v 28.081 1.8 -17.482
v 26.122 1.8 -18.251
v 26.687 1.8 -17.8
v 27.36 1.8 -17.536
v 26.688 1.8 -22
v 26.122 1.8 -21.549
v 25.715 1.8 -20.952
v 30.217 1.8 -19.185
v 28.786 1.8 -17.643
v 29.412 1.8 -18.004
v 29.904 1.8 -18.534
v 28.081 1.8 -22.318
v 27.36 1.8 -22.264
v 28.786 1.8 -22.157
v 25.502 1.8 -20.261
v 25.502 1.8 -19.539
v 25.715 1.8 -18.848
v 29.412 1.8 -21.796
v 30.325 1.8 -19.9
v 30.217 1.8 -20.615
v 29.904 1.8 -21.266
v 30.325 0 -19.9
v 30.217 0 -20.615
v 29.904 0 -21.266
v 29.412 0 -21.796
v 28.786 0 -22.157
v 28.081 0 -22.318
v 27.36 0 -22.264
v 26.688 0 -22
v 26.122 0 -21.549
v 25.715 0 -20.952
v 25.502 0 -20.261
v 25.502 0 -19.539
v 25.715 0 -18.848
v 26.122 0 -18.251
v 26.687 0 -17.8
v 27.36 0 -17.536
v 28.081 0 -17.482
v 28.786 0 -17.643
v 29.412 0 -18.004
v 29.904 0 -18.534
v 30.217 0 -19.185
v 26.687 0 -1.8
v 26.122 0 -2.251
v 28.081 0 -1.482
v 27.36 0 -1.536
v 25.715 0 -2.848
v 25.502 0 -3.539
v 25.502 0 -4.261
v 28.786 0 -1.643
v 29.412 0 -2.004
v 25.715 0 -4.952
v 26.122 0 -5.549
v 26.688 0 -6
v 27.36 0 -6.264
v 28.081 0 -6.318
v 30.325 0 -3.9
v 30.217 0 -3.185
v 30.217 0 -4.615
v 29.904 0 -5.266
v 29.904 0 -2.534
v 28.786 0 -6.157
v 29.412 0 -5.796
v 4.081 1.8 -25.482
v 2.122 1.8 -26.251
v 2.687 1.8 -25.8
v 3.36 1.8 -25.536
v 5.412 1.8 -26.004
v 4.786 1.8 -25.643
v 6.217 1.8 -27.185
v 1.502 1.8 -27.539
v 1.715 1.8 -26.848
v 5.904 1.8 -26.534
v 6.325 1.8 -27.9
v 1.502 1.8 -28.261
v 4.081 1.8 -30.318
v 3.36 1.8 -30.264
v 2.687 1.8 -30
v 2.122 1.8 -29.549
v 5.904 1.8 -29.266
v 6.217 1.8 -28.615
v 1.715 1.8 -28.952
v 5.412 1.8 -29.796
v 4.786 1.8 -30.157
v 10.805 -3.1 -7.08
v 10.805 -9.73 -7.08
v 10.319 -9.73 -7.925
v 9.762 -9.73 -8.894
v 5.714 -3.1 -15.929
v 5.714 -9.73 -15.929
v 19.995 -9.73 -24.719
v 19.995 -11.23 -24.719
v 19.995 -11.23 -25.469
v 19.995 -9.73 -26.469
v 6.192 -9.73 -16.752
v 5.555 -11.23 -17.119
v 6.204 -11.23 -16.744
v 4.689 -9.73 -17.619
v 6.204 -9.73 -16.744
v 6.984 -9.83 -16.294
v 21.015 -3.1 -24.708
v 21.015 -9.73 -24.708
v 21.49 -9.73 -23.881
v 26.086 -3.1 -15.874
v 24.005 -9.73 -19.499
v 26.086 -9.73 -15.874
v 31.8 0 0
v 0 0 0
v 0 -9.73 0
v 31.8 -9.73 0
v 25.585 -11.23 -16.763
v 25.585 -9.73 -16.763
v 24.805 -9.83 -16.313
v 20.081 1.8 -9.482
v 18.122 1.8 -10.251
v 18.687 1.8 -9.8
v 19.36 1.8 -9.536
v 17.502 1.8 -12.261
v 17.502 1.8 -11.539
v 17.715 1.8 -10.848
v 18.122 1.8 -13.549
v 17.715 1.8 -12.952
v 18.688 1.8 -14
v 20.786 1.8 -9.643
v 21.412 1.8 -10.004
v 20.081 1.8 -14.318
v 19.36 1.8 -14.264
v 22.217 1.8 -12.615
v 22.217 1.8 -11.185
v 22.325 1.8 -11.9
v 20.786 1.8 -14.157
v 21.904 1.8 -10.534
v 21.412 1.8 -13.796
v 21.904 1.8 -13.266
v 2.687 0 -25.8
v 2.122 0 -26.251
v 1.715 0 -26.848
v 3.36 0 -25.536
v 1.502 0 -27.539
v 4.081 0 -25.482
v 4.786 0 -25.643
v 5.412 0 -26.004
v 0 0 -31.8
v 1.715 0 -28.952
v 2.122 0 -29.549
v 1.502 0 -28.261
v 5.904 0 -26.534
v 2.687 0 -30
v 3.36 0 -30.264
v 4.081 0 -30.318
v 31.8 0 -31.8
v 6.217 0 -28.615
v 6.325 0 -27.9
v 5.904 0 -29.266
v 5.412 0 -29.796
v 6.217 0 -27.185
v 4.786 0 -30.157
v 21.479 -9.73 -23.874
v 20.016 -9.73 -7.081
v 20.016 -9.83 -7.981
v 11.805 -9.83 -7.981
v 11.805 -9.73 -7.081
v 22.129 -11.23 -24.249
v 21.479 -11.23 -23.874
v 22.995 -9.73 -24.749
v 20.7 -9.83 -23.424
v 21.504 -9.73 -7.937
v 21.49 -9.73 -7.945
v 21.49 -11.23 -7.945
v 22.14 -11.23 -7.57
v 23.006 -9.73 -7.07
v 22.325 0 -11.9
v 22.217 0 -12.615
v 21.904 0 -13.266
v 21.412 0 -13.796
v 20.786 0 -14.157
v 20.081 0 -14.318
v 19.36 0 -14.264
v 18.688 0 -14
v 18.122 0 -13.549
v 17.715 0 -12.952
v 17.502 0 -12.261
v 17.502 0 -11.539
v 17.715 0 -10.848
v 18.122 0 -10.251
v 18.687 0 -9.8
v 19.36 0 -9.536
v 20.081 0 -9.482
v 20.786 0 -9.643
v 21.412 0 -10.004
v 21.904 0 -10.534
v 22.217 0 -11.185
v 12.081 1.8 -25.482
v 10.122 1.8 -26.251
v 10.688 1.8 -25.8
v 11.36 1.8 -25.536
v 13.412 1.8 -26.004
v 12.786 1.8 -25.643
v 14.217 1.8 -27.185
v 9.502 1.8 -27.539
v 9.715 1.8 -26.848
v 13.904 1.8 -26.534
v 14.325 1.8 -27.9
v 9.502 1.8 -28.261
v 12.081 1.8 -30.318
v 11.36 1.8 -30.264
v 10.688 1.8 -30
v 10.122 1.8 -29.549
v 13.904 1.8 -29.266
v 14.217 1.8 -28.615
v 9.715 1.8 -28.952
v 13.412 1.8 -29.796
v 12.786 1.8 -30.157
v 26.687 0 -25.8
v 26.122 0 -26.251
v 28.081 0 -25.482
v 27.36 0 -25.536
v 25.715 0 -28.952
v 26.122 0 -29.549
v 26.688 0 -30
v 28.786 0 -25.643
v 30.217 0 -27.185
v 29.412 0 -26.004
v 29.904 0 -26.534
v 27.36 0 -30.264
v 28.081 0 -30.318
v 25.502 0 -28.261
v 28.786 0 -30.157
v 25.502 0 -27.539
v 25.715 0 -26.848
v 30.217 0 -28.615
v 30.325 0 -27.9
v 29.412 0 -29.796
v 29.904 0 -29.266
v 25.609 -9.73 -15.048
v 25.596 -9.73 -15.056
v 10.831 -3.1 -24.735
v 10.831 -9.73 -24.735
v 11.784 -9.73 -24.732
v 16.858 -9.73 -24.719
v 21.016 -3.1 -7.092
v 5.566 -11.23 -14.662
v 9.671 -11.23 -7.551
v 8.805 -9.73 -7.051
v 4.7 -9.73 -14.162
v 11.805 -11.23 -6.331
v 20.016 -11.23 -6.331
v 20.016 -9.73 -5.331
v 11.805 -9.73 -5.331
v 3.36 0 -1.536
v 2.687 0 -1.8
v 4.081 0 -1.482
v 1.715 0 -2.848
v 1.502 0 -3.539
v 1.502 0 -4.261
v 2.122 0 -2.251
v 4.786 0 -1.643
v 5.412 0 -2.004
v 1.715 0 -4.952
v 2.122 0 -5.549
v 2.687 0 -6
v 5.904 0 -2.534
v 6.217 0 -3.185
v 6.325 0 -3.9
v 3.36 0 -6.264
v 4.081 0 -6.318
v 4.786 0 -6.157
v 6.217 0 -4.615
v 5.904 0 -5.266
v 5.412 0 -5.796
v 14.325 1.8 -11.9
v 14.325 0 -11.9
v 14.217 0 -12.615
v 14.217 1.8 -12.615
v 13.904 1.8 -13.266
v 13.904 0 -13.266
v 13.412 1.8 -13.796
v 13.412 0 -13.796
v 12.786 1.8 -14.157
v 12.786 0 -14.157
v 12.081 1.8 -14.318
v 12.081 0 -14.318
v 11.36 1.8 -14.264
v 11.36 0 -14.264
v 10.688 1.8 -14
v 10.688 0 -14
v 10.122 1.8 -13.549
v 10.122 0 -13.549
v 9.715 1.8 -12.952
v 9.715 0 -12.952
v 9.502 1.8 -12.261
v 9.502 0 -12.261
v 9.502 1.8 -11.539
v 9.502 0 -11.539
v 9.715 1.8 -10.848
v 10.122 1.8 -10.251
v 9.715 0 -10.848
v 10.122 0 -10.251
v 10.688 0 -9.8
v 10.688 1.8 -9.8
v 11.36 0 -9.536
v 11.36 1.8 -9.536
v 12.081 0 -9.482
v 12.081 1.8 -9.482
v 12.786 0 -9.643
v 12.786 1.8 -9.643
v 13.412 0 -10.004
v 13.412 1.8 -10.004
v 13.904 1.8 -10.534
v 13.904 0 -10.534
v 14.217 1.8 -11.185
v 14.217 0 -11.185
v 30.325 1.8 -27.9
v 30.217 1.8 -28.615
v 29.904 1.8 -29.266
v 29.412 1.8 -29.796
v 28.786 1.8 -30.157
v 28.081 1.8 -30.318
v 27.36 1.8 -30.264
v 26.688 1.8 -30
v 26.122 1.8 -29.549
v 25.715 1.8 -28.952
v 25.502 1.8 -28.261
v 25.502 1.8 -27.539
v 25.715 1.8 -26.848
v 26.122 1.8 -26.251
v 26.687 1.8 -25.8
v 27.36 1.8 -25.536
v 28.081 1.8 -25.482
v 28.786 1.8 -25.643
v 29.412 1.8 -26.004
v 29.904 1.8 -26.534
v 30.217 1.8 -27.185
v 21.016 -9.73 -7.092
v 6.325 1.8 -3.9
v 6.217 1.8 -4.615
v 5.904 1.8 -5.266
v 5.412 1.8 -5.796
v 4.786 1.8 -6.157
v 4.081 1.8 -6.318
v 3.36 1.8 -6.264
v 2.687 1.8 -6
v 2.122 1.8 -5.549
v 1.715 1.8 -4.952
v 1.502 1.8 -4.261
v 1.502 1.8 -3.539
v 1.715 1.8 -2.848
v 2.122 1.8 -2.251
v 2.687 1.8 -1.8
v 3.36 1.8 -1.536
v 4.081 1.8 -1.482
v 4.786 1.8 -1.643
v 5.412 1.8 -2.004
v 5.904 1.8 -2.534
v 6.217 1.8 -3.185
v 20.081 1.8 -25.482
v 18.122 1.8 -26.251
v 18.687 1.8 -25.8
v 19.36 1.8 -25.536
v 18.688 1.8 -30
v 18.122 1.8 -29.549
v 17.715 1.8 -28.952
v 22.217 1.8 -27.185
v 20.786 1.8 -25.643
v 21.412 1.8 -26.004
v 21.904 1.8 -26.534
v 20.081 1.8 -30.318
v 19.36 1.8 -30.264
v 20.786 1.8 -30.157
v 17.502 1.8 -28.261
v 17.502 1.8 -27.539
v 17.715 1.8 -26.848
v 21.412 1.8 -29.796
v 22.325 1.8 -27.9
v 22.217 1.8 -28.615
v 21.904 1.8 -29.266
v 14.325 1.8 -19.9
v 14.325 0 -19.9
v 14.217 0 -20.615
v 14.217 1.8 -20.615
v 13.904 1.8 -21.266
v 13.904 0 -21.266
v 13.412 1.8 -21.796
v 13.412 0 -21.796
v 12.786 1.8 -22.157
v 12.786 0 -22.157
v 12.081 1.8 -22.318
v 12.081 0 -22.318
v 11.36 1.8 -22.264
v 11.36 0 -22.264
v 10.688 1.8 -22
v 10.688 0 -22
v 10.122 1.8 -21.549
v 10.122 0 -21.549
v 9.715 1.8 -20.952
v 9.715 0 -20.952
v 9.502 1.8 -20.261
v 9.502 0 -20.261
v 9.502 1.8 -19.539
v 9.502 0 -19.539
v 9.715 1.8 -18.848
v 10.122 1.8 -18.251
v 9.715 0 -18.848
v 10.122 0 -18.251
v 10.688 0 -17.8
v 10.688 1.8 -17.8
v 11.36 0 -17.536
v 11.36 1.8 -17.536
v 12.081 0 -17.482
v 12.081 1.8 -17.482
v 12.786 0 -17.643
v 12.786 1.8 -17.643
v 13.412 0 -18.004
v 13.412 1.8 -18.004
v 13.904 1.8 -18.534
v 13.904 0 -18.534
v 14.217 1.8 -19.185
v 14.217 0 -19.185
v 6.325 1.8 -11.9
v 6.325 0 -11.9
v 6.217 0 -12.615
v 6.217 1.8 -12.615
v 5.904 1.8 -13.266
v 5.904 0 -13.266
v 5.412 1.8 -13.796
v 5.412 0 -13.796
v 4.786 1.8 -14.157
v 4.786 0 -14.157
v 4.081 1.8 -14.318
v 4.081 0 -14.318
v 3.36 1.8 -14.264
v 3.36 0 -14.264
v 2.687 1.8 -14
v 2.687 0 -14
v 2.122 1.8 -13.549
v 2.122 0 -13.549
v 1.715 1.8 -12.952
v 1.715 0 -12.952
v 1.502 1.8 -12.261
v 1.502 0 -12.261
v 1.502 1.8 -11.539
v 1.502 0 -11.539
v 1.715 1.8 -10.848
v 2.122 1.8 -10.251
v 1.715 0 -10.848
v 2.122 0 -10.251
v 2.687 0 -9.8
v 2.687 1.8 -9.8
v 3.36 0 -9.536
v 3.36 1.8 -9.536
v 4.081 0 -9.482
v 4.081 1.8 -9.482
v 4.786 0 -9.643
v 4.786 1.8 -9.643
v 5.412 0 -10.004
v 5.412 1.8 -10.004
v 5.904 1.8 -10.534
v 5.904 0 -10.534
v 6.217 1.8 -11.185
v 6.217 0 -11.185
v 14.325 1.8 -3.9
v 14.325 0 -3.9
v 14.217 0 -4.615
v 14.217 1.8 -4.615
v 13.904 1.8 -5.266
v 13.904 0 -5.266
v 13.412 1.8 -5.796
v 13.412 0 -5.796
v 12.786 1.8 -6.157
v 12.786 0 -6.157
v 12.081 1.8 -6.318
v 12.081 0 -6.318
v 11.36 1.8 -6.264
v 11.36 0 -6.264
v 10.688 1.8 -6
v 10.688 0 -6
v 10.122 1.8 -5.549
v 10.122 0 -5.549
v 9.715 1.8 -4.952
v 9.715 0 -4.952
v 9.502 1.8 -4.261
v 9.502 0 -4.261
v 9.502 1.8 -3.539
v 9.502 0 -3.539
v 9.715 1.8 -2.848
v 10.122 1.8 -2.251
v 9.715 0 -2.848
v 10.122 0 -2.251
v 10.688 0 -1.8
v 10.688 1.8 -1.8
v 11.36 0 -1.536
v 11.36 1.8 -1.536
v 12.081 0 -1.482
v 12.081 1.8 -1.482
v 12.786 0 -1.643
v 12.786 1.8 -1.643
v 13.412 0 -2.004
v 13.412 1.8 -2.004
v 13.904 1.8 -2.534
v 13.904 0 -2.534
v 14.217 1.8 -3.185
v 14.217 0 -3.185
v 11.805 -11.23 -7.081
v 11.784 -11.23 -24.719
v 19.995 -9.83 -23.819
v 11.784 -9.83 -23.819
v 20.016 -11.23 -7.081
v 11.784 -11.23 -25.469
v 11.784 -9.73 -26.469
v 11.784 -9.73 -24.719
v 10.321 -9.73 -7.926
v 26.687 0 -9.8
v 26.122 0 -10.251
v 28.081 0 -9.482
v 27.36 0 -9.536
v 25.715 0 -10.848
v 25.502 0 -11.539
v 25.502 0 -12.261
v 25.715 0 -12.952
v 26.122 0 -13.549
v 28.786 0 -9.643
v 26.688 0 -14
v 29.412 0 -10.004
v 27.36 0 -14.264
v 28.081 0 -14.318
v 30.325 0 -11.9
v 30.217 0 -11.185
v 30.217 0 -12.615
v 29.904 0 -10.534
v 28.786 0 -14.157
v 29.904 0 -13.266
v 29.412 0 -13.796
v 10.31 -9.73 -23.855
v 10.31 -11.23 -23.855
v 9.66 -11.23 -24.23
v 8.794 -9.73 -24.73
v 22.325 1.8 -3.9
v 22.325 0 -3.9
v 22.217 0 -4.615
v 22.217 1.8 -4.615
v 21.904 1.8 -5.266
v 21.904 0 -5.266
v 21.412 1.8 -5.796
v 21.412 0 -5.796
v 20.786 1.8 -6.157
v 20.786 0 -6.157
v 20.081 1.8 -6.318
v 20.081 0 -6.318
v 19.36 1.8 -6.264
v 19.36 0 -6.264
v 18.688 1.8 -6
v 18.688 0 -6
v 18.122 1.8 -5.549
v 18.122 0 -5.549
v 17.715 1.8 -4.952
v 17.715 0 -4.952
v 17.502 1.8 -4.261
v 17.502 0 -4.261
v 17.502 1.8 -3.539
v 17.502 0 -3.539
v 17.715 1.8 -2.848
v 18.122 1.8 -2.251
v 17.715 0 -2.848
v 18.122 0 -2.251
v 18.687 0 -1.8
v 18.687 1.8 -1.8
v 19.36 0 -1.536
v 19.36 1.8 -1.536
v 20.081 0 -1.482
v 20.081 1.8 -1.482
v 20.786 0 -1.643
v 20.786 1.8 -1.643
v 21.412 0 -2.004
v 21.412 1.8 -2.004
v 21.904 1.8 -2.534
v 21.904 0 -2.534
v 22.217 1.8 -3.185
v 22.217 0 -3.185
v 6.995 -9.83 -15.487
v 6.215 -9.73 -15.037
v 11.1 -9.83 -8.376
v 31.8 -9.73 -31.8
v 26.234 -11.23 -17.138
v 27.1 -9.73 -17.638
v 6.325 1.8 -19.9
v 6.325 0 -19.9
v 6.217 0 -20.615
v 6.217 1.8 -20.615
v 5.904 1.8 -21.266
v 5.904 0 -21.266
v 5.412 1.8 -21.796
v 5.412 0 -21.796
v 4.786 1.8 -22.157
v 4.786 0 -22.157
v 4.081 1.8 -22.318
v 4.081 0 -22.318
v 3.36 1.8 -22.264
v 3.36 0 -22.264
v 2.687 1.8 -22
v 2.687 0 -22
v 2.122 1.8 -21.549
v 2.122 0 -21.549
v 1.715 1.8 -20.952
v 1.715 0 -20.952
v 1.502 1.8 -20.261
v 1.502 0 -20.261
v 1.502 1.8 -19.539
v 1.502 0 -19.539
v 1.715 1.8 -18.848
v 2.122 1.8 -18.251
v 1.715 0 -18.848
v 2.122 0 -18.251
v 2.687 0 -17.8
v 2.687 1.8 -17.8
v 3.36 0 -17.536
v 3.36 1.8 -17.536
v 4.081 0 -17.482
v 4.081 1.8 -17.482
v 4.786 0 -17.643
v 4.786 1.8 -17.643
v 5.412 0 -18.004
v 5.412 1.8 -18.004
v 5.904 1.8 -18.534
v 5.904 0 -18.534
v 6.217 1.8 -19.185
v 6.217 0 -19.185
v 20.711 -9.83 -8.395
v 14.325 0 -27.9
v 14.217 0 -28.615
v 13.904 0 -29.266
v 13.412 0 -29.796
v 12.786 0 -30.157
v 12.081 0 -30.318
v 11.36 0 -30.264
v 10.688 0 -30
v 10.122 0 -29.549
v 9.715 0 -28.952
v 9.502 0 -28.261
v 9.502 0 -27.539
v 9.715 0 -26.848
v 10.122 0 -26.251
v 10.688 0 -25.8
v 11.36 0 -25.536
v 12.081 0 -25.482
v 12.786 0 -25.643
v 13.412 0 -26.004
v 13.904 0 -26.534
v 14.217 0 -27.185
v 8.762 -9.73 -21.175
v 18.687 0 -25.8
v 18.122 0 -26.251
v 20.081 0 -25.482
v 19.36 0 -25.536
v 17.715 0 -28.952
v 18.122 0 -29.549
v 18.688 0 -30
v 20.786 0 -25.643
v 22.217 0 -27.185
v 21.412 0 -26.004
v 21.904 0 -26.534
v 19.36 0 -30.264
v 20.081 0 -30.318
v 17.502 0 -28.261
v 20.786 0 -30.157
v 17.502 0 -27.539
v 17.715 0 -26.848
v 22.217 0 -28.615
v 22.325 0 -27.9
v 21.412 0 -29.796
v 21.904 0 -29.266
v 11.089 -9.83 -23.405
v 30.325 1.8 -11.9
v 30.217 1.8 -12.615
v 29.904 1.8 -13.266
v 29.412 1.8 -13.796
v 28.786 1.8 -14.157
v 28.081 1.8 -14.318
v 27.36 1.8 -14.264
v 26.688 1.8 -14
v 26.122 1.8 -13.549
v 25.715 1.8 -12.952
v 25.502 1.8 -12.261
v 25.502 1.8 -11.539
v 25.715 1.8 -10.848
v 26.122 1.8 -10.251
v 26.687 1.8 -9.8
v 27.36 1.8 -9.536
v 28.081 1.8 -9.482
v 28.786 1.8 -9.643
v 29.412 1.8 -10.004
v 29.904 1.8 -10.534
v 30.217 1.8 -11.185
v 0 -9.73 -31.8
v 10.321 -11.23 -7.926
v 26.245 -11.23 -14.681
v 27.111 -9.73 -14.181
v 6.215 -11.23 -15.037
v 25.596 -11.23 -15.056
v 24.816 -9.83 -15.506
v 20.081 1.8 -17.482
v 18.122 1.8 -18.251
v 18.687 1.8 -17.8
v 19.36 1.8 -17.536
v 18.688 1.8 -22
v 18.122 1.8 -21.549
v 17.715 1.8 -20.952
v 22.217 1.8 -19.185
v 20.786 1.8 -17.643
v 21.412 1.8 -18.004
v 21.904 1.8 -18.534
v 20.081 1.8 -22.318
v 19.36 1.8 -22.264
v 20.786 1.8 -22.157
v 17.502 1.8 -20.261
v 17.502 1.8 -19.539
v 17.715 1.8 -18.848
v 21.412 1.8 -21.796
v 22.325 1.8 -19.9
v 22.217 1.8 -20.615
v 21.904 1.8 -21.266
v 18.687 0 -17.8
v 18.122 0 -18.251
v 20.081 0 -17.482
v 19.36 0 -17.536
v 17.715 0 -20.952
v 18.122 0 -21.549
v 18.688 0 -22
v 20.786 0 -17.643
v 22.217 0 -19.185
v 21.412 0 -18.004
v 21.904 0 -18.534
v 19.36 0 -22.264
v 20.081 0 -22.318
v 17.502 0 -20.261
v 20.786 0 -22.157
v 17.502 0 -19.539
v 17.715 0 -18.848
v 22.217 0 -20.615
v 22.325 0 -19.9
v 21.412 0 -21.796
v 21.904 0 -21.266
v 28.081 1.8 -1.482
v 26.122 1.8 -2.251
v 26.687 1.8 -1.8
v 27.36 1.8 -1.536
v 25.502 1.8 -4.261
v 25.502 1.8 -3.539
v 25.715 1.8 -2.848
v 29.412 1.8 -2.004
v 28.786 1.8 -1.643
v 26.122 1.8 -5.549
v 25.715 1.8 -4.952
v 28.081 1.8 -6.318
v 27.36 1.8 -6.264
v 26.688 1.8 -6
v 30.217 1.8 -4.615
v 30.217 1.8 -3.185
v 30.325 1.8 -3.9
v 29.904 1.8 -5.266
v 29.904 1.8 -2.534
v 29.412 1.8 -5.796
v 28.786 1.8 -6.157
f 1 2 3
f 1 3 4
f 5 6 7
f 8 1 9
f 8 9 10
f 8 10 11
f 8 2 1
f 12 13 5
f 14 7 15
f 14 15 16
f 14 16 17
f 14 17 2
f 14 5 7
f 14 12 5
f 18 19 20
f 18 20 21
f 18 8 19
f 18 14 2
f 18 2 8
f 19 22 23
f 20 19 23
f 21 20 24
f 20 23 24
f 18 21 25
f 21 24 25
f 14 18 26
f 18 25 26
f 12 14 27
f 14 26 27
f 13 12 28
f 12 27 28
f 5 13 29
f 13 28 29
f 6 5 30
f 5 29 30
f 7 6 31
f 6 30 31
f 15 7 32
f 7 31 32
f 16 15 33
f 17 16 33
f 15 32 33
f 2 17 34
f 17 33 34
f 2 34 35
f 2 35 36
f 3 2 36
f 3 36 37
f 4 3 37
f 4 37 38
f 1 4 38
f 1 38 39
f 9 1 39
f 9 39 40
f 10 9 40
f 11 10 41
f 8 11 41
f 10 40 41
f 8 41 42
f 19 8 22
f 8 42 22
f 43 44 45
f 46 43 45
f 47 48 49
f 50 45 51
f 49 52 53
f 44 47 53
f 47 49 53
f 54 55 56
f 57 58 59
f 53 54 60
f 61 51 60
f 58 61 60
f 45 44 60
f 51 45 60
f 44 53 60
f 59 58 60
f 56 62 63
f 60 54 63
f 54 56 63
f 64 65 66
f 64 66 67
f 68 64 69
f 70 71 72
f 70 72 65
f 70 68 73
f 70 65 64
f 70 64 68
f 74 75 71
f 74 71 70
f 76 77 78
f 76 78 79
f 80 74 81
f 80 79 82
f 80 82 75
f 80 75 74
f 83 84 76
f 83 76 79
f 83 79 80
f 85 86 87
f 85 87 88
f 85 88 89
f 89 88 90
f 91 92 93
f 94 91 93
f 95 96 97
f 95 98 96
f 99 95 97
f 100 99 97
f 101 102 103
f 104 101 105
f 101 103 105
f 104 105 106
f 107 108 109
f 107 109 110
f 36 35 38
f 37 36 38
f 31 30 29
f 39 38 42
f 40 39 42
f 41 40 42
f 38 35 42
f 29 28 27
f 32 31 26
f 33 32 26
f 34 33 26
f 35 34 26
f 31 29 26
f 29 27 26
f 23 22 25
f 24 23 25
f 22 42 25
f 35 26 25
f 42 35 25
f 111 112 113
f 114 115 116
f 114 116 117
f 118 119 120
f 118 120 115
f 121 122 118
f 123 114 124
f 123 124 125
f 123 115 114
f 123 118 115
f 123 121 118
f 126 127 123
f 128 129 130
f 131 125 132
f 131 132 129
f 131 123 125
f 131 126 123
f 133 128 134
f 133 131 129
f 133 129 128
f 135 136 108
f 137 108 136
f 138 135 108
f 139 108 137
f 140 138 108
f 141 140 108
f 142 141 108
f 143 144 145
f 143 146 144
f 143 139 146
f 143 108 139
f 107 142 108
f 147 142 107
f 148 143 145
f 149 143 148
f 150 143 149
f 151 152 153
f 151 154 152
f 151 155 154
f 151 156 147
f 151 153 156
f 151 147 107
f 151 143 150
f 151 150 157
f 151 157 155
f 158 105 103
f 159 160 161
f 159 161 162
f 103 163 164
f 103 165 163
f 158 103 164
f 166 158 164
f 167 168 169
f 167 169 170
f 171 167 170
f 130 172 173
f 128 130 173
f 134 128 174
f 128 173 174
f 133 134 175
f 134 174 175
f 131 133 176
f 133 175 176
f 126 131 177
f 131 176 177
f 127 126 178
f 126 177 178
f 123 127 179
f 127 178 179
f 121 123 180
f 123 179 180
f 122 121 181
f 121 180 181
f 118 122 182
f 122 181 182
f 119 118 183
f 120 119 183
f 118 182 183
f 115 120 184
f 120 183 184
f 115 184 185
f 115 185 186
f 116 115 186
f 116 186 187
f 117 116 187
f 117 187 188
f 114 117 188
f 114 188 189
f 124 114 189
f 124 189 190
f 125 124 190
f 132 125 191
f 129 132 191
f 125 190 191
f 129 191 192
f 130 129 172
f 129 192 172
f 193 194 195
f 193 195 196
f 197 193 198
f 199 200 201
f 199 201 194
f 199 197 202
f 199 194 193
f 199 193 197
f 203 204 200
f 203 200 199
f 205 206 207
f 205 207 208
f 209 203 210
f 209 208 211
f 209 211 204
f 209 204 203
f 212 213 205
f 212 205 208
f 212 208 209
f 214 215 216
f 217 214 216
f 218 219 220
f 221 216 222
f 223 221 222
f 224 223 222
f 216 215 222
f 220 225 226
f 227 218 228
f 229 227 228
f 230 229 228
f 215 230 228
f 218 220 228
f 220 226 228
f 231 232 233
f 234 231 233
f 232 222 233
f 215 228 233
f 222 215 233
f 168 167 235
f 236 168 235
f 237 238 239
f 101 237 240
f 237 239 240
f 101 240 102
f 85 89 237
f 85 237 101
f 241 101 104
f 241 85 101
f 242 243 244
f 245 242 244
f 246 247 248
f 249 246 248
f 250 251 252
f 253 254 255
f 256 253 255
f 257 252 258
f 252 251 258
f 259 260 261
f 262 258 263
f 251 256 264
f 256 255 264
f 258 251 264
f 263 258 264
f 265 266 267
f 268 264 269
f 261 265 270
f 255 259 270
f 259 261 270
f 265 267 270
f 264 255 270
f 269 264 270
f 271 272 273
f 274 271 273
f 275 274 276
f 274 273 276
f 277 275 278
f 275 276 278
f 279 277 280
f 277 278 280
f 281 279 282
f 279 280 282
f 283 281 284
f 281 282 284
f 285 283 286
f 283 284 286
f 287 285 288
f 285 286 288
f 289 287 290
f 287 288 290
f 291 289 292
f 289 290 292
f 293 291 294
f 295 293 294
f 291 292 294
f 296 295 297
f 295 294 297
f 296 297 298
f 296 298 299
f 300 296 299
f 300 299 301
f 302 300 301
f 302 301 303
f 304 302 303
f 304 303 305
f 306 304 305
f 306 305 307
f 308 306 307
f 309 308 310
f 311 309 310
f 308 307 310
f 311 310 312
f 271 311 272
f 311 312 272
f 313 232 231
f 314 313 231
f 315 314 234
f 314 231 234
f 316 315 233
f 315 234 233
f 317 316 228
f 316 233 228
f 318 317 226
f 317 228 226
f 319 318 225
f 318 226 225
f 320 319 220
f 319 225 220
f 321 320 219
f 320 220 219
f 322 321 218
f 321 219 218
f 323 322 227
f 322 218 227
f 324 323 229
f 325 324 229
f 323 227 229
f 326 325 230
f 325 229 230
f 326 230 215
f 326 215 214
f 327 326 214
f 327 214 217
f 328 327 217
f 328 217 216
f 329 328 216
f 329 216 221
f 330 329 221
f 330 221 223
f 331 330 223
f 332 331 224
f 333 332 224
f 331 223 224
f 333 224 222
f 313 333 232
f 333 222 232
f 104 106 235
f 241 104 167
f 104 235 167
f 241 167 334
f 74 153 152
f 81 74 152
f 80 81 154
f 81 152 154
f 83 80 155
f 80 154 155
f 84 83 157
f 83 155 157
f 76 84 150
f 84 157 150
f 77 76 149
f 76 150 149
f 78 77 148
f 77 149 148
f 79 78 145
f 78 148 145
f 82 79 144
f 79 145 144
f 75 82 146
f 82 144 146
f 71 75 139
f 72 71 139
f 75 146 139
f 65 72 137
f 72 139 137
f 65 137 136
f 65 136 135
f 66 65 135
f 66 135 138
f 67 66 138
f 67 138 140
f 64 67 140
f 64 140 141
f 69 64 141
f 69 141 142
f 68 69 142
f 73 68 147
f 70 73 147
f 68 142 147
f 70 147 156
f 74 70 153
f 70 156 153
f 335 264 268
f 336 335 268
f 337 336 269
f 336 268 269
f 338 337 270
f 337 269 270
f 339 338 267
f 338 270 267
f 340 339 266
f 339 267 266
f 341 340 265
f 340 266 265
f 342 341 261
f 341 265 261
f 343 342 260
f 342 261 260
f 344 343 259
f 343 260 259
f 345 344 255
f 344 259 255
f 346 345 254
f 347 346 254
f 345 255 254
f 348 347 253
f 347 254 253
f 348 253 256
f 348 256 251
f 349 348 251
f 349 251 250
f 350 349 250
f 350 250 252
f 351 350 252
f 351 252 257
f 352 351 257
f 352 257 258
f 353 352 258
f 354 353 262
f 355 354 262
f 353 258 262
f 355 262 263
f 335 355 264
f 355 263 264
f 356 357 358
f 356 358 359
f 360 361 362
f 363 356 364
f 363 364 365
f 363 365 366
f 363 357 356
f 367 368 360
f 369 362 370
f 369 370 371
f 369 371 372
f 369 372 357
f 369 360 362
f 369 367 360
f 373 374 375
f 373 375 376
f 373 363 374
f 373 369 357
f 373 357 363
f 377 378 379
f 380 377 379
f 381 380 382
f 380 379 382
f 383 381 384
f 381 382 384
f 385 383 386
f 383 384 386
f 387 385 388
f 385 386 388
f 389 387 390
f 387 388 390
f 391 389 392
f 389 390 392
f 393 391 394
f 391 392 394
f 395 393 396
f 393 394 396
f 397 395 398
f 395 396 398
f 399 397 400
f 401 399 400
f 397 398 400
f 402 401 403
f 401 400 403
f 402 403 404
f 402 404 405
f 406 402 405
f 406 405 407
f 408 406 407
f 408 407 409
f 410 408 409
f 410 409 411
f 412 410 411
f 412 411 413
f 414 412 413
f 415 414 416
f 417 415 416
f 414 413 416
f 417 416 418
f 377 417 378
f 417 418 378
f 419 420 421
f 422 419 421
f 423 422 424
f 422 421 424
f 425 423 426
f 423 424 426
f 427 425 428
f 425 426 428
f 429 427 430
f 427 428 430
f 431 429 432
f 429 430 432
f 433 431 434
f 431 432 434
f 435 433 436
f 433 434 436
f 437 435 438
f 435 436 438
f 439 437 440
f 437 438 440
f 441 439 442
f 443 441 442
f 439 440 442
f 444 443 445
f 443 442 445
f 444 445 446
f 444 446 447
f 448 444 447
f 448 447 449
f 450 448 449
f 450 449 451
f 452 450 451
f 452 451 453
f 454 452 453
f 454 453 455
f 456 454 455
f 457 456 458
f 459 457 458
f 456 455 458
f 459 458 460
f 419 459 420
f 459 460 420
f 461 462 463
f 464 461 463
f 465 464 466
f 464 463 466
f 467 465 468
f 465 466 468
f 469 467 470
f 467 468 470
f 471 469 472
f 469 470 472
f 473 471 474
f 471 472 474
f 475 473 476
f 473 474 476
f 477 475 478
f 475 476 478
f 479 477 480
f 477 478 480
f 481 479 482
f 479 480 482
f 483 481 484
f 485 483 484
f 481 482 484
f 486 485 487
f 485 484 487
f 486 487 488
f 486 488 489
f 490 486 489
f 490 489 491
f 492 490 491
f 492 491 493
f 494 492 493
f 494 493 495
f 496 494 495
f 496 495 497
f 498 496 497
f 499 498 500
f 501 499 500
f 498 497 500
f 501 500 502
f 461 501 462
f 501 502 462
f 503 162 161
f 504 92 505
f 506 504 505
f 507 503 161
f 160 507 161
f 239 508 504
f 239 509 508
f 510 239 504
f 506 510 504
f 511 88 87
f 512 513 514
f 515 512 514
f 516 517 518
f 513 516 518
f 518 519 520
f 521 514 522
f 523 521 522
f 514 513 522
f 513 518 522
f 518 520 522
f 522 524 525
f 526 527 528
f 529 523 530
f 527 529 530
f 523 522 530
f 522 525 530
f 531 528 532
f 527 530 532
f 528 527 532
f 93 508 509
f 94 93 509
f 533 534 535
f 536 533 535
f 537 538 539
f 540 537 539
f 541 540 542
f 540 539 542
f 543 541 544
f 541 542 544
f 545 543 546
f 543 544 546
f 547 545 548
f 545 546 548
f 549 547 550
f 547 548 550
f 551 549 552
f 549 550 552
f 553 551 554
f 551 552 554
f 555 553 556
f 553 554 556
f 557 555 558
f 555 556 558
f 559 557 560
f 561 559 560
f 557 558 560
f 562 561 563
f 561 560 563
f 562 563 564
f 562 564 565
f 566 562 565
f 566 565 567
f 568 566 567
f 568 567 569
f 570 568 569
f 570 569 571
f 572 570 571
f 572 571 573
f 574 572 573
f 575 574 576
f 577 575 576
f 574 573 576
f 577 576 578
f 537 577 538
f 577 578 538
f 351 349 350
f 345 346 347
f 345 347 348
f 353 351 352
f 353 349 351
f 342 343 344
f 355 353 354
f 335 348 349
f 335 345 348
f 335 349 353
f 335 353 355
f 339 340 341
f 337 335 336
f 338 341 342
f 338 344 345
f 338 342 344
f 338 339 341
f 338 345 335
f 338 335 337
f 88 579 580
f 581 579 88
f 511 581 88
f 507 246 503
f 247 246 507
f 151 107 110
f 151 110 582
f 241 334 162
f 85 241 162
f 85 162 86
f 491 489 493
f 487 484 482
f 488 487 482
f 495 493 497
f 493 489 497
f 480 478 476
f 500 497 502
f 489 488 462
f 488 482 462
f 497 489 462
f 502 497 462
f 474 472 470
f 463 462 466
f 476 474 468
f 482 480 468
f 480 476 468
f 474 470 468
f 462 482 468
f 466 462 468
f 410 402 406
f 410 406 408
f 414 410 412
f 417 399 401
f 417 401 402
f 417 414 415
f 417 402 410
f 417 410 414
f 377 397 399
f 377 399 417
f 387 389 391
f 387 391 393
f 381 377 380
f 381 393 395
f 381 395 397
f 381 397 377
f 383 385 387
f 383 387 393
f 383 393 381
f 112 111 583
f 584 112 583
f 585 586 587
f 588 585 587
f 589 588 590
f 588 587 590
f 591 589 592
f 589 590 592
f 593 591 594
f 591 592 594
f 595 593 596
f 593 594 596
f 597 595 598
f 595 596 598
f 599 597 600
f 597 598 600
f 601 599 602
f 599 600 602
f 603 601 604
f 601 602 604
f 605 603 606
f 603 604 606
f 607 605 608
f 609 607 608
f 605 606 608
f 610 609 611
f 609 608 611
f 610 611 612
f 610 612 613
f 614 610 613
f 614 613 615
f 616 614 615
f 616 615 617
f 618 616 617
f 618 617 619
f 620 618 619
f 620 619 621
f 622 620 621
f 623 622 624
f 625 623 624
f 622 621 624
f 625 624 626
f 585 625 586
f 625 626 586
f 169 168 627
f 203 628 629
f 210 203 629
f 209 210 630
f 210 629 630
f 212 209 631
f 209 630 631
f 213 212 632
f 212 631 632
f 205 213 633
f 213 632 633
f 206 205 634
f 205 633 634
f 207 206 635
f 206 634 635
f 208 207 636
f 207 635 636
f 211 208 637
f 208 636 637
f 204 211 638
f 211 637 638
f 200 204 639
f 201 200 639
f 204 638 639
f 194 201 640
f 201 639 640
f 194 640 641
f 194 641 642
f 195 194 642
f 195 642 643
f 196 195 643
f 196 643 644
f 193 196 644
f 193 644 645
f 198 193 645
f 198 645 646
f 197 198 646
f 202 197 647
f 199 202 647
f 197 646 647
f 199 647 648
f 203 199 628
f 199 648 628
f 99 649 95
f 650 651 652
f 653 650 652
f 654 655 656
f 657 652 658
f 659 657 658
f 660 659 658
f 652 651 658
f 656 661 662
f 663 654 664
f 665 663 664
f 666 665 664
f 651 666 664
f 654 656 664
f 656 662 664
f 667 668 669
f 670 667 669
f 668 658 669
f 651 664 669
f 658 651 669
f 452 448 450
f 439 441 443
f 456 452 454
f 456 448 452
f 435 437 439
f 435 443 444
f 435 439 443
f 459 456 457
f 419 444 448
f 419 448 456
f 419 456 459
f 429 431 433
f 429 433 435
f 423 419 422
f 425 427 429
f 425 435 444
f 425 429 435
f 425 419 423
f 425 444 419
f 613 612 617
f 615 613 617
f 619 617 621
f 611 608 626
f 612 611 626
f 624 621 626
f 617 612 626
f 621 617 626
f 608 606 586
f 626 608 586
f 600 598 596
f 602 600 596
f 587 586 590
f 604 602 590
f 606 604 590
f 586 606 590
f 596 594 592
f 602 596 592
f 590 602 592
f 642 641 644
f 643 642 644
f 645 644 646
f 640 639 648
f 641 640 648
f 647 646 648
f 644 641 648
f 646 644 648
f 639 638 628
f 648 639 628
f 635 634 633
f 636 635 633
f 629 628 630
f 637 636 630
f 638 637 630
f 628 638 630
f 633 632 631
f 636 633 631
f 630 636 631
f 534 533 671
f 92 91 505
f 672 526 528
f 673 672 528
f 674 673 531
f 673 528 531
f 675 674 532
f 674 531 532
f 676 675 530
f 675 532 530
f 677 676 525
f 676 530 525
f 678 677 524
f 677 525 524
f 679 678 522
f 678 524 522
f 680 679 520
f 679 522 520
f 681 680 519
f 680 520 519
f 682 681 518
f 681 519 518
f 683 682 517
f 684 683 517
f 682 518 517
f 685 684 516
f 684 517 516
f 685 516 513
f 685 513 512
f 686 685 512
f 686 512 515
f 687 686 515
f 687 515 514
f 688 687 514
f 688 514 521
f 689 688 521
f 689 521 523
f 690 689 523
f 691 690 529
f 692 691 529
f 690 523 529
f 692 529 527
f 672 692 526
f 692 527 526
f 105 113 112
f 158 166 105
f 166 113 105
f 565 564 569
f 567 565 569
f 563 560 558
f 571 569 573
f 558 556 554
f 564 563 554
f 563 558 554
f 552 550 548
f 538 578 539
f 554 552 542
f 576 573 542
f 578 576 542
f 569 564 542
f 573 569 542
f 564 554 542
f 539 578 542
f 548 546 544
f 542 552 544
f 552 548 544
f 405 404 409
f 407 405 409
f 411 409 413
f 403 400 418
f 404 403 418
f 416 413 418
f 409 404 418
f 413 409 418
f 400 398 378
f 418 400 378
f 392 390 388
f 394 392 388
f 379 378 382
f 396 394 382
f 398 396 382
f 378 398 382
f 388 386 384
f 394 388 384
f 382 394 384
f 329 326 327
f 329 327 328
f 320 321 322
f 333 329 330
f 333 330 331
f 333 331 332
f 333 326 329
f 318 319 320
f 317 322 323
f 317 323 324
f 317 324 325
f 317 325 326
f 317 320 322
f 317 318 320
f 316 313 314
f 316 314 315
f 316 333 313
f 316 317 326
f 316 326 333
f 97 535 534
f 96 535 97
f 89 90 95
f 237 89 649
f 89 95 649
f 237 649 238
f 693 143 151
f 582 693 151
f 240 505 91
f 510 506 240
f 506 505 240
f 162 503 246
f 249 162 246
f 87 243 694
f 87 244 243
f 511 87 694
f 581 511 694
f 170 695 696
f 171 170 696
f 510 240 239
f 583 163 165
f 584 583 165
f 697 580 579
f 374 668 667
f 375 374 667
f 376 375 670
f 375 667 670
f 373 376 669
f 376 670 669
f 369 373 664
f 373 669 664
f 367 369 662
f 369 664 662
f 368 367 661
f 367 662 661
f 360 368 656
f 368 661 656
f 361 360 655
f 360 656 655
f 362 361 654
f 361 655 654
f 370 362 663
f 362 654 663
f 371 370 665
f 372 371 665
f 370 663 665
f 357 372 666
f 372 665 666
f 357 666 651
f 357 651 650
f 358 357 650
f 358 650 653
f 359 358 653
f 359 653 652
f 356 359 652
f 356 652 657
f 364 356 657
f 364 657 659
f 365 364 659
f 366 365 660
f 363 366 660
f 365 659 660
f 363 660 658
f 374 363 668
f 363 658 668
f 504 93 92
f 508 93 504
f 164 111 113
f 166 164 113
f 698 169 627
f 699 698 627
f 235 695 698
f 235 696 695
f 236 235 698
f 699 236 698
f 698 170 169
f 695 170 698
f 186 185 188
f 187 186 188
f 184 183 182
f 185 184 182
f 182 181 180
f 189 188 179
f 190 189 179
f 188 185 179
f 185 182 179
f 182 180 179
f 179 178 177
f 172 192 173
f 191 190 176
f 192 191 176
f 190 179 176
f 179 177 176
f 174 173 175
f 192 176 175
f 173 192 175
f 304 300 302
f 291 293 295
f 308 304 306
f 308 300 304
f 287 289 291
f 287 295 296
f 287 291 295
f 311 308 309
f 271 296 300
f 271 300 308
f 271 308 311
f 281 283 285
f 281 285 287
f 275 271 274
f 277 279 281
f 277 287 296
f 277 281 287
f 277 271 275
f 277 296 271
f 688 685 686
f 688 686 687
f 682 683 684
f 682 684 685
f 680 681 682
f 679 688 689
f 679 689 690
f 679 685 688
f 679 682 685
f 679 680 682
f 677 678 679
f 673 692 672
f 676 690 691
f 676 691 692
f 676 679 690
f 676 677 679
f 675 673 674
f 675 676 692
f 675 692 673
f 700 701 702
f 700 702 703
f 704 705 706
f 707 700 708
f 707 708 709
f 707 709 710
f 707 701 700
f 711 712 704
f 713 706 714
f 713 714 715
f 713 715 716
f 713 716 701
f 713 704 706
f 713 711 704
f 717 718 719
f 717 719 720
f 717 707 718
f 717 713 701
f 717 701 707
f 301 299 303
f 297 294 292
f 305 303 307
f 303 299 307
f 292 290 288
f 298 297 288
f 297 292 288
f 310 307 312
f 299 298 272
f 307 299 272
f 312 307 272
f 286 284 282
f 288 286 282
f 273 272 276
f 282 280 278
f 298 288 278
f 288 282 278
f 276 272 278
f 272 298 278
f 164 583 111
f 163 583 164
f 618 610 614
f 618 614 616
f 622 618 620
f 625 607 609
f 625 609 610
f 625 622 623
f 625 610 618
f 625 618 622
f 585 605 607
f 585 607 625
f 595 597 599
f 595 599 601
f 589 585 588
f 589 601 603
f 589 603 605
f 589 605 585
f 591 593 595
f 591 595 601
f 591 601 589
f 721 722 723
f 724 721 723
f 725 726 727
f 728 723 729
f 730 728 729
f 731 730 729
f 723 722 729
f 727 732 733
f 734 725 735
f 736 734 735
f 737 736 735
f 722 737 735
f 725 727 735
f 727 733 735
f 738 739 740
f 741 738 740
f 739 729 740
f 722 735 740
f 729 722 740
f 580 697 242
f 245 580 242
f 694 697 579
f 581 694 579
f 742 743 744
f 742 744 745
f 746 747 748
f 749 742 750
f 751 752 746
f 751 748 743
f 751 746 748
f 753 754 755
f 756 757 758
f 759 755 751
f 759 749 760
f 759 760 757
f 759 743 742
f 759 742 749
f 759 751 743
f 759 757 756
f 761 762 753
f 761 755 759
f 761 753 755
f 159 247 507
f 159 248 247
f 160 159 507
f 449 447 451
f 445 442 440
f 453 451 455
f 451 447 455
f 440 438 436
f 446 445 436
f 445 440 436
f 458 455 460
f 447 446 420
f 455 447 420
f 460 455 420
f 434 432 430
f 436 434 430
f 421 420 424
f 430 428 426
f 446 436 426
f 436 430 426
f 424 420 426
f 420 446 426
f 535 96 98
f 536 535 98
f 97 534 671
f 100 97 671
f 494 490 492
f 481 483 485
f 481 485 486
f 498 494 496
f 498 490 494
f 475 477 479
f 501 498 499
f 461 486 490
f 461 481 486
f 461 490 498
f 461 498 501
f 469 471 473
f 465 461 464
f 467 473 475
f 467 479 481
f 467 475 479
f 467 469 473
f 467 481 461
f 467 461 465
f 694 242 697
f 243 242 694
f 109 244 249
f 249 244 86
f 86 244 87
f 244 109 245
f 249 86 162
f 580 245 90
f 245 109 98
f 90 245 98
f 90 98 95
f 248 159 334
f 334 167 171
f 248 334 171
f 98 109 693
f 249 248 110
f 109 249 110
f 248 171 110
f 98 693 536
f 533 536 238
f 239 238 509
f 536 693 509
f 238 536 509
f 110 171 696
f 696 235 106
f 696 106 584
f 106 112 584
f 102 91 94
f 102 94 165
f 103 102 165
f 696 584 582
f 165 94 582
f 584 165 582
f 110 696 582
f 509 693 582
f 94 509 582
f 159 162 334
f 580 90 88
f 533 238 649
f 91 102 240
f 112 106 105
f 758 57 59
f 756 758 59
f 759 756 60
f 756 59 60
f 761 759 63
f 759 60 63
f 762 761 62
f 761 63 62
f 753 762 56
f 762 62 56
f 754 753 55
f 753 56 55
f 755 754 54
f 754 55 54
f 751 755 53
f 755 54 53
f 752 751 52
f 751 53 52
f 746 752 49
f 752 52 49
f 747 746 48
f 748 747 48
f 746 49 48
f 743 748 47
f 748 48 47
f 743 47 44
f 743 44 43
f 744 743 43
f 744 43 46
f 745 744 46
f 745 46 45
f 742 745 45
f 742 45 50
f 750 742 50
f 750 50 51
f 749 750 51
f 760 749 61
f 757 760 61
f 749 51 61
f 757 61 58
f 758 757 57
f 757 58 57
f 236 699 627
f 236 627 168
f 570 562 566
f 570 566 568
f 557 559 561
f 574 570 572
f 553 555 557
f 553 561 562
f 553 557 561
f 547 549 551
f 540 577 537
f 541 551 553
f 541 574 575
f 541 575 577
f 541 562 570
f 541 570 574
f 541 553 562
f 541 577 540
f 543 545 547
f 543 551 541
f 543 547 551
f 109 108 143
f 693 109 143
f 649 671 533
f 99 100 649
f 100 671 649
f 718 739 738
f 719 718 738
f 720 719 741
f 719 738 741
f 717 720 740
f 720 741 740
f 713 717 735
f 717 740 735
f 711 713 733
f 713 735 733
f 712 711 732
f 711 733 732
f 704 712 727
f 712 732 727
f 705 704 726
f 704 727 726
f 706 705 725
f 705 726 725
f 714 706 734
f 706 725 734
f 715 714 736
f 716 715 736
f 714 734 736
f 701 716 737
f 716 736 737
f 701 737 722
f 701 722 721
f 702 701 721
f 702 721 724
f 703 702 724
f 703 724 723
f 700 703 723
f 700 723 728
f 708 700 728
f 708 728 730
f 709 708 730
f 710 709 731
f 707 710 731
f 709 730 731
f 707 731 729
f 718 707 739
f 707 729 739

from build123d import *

# Parameters (mm, degrees)
SKETCH2_R              = 2.425
BOSS_EXTRUDE1_DEPTH    = 1.8
BOSS_EXTRUDE1_2_DEPTH  = 1.8
BOSS_EXTRUDE1_3_DEPTH  = 1.8
BOSS_EXTRUDE1_4_DEPTH  = 1.8
BOSS_EXTRUDE1_5_DEPTH  = 1.8
BOSS_EXTRUDE1_6_DEPTH  = 1.8
BOSS_EXTRUDE1_7_DEPTH  = 1.8
BOSS_EXTRUDE1_8_DEPTH  = 1.8
BOSS_EXTRUDE1_9_DEPTH  = 1.8
BOSS_EXTRUDE1_10_DEPTH = 1.8
BOSS_EXTRUDE1_11_DEPTH = 1.8
BOSS_EXTRUDE1_12_DEPTH = 1.8
BOSS_EXTRUDE1_13_DEPTH = 1.8
BOSS_EXTRUDE1_14_DEPTH = 1.8
BOSS_EXTRUDE1_15_DEPTH = 1.8
BOSS_EXTRUDE1_16_DEPTH = 1.8
SKETCH1_W              = 31.8
SKETCH1_H              = 31.8
BOSS_EXTRUDE2_DEPTH    = 9.73
CUT_EXTRUDE1_DEPTH     = 6.63
SKETCH9_W              = 8.211044263
SKETCH9_H              = 1.75
BOSS_EXTRUDE4_DEPTH    = 1.5
BOSS_EXTRUDE5_DEPTH    = 8.211044
CUT_EXTRUDE4_DEPTH     = 8.211044
CIRPATTERN3_COUNT      = 6


with BuildPart() as part:
    # Sketch2 → Boss-Extrude1 (new body)
    with BuildSketch(Plane(origin=(0, 0, 0), x_dir=(1, 0, 0), z_dir=(0, 1, 0))):
        with Locations((3.9, 27.9)):
            Circle(SKETCH2_R)
    extrude(amount=BOSS_EXTRUDE1_DEPTH)

    # Sketch1 → Boss-Extrude2 (add)
    with BuildSketch(Plane(origin=(0, 0, 0), x_dir=(1, 0, 0), z_dir=(0, 1, 0))):
        with Locations((15.9, 15.9)):
            Rectangle(SKETCH1_W, SKETCH1_H)
    extrude(amount=-BOSS_EXTRUDE2_DEPTH)

    # Sketch4 → Cut-Extrude1 (cut)
    with BuildSketch(Plane.XZ.offset(9.73)):
        Polygon((26.085733965, -15.874437919), (21.016403127, -7.092489065), (10.805424678, -7.07984512), (5.714275589, -15.929121347), (10.830590574, -24.734643054), (21.015442313, -24.708069014), align=None)
    extrude(amount=-CUT_EXTRUDE1_DEPTH, mode=Mode.SUBTRACT)

    # Sketch9 → Boss-Extrude4 (add)
    with BuildSketch(Plane.XZ.offset(9.73)):
        with Locations((15.910946043, -6.206083389)):
            Rectangle(SKETCH9_W, SKETCH9_H)
    boss_extrude4 = extrude(amount=BOSS_EXTRUDE4_DEPTH)

    # Sketch10 → Boss-Extrude5 (add)
    with BuildSketch(Plane(origin=(20.016468174, 0, 0), x_dir=(0, 0, -1), z_dir=(1, 0, 0))):
        Polygon((7.081083389, -11.23), (7.981083389, -9.83), (7.081083389, -9.73), align=None)
    boss_extrude5 = extrude(amount=-BOSS_EXTRUDE5_DEPTH)

    # Sketch11 → Cut-Extrude4 (cut)
    with BuildSketch(Plane(origin=(20.016468174, 0, 0), x_dir=(0, 0, -1), z_dir=(1, 0, 0))):
        Polygon((6.331083389, -11.23), (5.331083389, -9.73), (5.331083389, -11.23), align=None)
    cut_extrude4 = extrude(amount=-CUT_EXTRUDE4_DEPTH, mode=Mode.SUBTRACT)

    # CirPattern3: Boss-Extrude4, Boss-Extrude5, Cut-Extrude4 ×6 about axis
    cirpattern3_axis = Axis((15.9, 0, -15.9), (0, 1, 0))
    for i in range(1, CIRPATTERN3_COUNT):
        add(boss_extrude4.rotate(cirpattern3_axis, i * 360 / CIRPATTERN3_COUNT))
        add(boss_extrude5.rotate(cirpattern3_axis, i * 360 / CIRPATTERN3_COUNT))
        add(cut_extrude4.rotate(cirpattern3_axis, i * 360 / CIRPATTERN3_COUNT), mode=Mode.SUBTRACT)


with BuildPart() as body_2:
    # Sketch2 → Boss-Extrude1 2 (new body)
    with BuildSketch(Plane(origin=(0, 0, 0), x_dir=(1, 0, 0), z_dir=(0, 1, 0))):
        with Locations((11.9, 27.9)):
            Circle(SKETCH2_R)
    extrude(amount=BOSS_EXTRUDE1_2_DEPTH)


with BuildPart() as body_3:
    # Sketch2 → Boss-Extrude1 3 (new body)
    with BuildSketch(Plane(origin=(0, 0, 0), x_dir=(1, 0, 0), z_dir=(0, 1, 0))):
        with Locations((19.9, 27.9)):
            Circle(SKETCH2_R)
    extrude(amount=BOSS_EXTRUDE1_3_DEPTH)


with BuildPart() as body_4:
    # Sketch2 → Boss-Extrude1 4 (new body)
    with BuildSketch(Plane(origin=(0, 0, 0), x_dir=(1, 0, 0), z_dir=(0, 1, 0))):
        with Locations((27.9, 27.9)):
            Circle(SKETCH2_R)
    extrude(amount=BOSS_EXTRUDE1_4_DEPTH)


with BuildPart() as body_5:
    # Sketch2 → Boss-Extrude1 5 (new body)
    with BuildSketch(Plane(origin=(0, 0, 0), x_dir=(1, 0, 0), z_dir=(0, 1, 0))):
        with Locations((11.9, 19.9)):
            Circle(SKETCH2_R)
    extrude(amount=BOSS_EXTRUDE1_5_DEPTH)


with BuildPart() as body_6:
    # Sketch2 → Boss-Extrude1 6 (new body)
    with BuildSketch(Plane(origin=(0, 0, 0), x_dir=(1, 0, 0), z_dir=(0, 1, 0))):
        with Locations((19.9, 19.9)):
            Circle(SKETCH2_R)
    extrude(amount=BOSS_EXTRUDE1_6_DEPTH)


with BuildPart() as body_7:
    # Sketch2 → Boss-Extrude1 7 (new body)
    with BuildSketch(Plane(origin=(0, 0, 0), x_dir=(1, 0, 0), z_dir=(0, 1, 0))):
        with Locations((27.9, 19.9)):
            Circle(SKETCH2_R)
    extrude(amount=BOSS_EXTRUDE1_7_DEPTH)


with BuildPart() as body_8:
    # Sketch2 → Boss-Extrude1 8 (new body)
    with BuildSketch(Plane(origin=(0, 0, 0), x_dir=(1, 0, 0), z_dir=(0, 1, 0))):
        with Locations((11.9, 11.9)):
            Circle(SKETCH2_R)
    extrude(amount=BOSS_EXTRUDE1_8_DEPTH)


with BuildPart() as body_9:
    # Sketch2 → Boss-Extrude1 9 (new body)
    with BuildSketch(Plane(origin=(0, 0, 0), x_dir=(1, 0, 0), z_dir=(0, 1, 0))):
        with Locations((19.9, 11.9)):
            Circle(SKETCH2_R)
    extrude(amount=BOSS_EXTRUDE1_9_DEPTH)


with BuildPart() as body_10:
    # Sketch2 → Boss-Extrude1 10 (new body)
    with BuildSketch(Plane(origin=(0, 0, 0), x_dir=(1, 0, 0), z_dir=(0, 1, 0))):
        with Locations((27.9, 11.9)):
            Circle(SKETCH2_R)
    extrude(amount=BOSS_EXTRUDE1_10_DEPTH)


with BuildPart() as body_11:
    # Sketch2 → Boss-Extrude1 11 (new body)
    with BuildSketch(Plane(origin=(0, 0, 0), x_dir=(1, 0, 0), z_dir=(0, 1, 0))):
        with Locations((11.9, 3.9)):
            Circle(SKETCH2_R)
    extrude(amount=BOSS_EXTRUDE1_11_DEPTH)


with BuildPart() as body_12:
    # Sketch2 → Boss-Extrude1 12 (new body)
    with BuildSketch(Plane(origin=(0, 0, 0), x_dir=(1, 0, 0), z_dir=(0, 1, 0))):
        with Locations((19.9, 3.9)):
            Circle(SKETCH2_R)
    extrude(amount=BOSS_EXTRUDE1_12_DEPTH)


with BuildPart() as body_13:
    # Sketch2 → Boss-Extrude1 13 (new body)
    with BuildSketch(Plane(origin=(0, 0, 0), x_dir=(1, 0, 0), z_dir=(0, 1, 0))):
        with Locations((27.9, 3.9)):
            Circle(SKETCH2_R)
    extrude(amount=BOSS_EXTRUDE1_13_DEPTH)


with BuildPart() as body_14:
    # Sketch2 → Boss-Extrude1 14 (new body)
    with BuildSketch(Plane(origin=(0, 0, 0), x_dir=(1, 0, 0), z_dir=(0, 1, 0))):
        with Locations((3.9, 19.9)):
            Circle(SKETCH2_R)
    extrude(amount=BOSS_EXTRUDE1_14_DEPTH)


with BuildPart() as body_15:
    # Sketch2 → Boss-Extrude1 15 (new body)
    with BuildSketch(Plane(origin=(0, 0, 0), x_dir=(1, 0, 0), z_dir=(0, 1, 0))):
        with Locations((3.9, 11.9)):
            Circle(SKETCH2_R)
    extrude(amount=BOSS_EXTRUDE1_15_DEPTH)


with BuildPart() as body_16:
    # Sketch2 → Boss-Extrude1 16 (new body)
    with BuildSketch(Plane(origin=(0, 0, 0), x_dir=(1, 0, 0), z_dir=(0, 1, 0))):
        with Locations((3.9, 3.9)):
            Circle(SKETCH2_R)
    extrude(amount=BOSS_EXTRUDE1_16_DEPTH)


solid = Compound([part.part, body_2.part, body_3.part, body_4.part, body_5.part, body_6.part, body_7.part, body_8.part, body_9.part, body_10.part, body_11.part, body_12.part, body_13.part, body_14.part, body_15.part, body_16.part])
